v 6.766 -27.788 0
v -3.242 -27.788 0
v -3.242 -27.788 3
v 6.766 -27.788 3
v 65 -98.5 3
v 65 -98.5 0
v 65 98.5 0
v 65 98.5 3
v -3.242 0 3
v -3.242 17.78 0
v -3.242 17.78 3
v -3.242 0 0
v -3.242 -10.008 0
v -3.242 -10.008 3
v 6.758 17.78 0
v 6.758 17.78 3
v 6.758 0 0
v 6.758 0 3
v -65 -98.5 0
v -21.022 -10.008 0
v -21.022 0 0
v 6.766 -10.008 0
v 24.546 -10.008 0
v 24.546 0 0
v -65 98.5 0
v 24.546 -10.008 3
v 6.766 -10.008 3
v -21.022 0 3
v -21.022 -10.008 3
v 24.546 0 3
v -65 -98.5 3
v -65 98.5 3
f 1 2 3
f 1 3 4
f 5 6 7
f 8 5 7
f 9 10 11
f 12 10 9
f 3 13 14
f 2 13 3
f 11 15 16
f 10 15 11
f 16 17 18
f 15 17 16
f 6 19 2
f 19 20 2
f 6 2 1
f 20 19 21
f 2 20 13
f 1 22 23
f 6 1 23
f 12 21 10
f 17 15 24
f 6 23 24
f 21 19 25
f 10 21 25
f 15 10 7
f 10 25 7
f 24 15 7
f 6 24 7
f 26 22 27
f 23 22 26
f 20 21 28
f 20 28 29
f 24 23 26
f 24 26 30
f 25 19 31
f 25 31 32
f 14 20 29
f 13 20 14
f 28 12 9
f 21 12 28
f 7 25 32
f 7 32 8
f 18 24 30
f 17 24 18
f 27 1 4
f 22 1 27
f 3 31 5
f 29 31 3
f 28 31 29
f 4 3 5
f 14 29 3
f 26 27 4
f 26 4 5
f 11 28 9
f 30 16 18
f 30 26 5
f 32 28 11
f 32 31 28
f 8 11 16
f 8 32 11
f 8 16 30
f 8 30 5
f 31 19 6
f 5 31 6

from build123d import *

# Parameters (mm, degrees)
F0_W     = 130
F0_H     = 197
F1_DEPTH = 3
F3_DEPTH = 9.652


with BuildPart() as f1:
    # F0 (on Top) → F1 (new body)
    with BuildSketch(Plane.XY):
        Rectangle(F0_W, F0_H)
    extrude(amount=F1_DEPTH)

    # F2 (on Top) → F3 (cut)
    with BuildSketch(Plane.XY):
        Polygon((6.758312, 0), (6.758312, 17.78), (-3.241688, 17.78), (-3.241688, 0), (-21.021688, 0), (-21.021688, -10.0076), (-3.241688, -10.0076), (-3.241688, -27.7876), (6.765912, -27.7876), (6.765912, -10.0076), (24.545912, -10.0076), (24.545912, 0), align=None)
    extrude(amount=F3_DEPTH, mode=Mode.SUBTRACT)


solid = f1.part
